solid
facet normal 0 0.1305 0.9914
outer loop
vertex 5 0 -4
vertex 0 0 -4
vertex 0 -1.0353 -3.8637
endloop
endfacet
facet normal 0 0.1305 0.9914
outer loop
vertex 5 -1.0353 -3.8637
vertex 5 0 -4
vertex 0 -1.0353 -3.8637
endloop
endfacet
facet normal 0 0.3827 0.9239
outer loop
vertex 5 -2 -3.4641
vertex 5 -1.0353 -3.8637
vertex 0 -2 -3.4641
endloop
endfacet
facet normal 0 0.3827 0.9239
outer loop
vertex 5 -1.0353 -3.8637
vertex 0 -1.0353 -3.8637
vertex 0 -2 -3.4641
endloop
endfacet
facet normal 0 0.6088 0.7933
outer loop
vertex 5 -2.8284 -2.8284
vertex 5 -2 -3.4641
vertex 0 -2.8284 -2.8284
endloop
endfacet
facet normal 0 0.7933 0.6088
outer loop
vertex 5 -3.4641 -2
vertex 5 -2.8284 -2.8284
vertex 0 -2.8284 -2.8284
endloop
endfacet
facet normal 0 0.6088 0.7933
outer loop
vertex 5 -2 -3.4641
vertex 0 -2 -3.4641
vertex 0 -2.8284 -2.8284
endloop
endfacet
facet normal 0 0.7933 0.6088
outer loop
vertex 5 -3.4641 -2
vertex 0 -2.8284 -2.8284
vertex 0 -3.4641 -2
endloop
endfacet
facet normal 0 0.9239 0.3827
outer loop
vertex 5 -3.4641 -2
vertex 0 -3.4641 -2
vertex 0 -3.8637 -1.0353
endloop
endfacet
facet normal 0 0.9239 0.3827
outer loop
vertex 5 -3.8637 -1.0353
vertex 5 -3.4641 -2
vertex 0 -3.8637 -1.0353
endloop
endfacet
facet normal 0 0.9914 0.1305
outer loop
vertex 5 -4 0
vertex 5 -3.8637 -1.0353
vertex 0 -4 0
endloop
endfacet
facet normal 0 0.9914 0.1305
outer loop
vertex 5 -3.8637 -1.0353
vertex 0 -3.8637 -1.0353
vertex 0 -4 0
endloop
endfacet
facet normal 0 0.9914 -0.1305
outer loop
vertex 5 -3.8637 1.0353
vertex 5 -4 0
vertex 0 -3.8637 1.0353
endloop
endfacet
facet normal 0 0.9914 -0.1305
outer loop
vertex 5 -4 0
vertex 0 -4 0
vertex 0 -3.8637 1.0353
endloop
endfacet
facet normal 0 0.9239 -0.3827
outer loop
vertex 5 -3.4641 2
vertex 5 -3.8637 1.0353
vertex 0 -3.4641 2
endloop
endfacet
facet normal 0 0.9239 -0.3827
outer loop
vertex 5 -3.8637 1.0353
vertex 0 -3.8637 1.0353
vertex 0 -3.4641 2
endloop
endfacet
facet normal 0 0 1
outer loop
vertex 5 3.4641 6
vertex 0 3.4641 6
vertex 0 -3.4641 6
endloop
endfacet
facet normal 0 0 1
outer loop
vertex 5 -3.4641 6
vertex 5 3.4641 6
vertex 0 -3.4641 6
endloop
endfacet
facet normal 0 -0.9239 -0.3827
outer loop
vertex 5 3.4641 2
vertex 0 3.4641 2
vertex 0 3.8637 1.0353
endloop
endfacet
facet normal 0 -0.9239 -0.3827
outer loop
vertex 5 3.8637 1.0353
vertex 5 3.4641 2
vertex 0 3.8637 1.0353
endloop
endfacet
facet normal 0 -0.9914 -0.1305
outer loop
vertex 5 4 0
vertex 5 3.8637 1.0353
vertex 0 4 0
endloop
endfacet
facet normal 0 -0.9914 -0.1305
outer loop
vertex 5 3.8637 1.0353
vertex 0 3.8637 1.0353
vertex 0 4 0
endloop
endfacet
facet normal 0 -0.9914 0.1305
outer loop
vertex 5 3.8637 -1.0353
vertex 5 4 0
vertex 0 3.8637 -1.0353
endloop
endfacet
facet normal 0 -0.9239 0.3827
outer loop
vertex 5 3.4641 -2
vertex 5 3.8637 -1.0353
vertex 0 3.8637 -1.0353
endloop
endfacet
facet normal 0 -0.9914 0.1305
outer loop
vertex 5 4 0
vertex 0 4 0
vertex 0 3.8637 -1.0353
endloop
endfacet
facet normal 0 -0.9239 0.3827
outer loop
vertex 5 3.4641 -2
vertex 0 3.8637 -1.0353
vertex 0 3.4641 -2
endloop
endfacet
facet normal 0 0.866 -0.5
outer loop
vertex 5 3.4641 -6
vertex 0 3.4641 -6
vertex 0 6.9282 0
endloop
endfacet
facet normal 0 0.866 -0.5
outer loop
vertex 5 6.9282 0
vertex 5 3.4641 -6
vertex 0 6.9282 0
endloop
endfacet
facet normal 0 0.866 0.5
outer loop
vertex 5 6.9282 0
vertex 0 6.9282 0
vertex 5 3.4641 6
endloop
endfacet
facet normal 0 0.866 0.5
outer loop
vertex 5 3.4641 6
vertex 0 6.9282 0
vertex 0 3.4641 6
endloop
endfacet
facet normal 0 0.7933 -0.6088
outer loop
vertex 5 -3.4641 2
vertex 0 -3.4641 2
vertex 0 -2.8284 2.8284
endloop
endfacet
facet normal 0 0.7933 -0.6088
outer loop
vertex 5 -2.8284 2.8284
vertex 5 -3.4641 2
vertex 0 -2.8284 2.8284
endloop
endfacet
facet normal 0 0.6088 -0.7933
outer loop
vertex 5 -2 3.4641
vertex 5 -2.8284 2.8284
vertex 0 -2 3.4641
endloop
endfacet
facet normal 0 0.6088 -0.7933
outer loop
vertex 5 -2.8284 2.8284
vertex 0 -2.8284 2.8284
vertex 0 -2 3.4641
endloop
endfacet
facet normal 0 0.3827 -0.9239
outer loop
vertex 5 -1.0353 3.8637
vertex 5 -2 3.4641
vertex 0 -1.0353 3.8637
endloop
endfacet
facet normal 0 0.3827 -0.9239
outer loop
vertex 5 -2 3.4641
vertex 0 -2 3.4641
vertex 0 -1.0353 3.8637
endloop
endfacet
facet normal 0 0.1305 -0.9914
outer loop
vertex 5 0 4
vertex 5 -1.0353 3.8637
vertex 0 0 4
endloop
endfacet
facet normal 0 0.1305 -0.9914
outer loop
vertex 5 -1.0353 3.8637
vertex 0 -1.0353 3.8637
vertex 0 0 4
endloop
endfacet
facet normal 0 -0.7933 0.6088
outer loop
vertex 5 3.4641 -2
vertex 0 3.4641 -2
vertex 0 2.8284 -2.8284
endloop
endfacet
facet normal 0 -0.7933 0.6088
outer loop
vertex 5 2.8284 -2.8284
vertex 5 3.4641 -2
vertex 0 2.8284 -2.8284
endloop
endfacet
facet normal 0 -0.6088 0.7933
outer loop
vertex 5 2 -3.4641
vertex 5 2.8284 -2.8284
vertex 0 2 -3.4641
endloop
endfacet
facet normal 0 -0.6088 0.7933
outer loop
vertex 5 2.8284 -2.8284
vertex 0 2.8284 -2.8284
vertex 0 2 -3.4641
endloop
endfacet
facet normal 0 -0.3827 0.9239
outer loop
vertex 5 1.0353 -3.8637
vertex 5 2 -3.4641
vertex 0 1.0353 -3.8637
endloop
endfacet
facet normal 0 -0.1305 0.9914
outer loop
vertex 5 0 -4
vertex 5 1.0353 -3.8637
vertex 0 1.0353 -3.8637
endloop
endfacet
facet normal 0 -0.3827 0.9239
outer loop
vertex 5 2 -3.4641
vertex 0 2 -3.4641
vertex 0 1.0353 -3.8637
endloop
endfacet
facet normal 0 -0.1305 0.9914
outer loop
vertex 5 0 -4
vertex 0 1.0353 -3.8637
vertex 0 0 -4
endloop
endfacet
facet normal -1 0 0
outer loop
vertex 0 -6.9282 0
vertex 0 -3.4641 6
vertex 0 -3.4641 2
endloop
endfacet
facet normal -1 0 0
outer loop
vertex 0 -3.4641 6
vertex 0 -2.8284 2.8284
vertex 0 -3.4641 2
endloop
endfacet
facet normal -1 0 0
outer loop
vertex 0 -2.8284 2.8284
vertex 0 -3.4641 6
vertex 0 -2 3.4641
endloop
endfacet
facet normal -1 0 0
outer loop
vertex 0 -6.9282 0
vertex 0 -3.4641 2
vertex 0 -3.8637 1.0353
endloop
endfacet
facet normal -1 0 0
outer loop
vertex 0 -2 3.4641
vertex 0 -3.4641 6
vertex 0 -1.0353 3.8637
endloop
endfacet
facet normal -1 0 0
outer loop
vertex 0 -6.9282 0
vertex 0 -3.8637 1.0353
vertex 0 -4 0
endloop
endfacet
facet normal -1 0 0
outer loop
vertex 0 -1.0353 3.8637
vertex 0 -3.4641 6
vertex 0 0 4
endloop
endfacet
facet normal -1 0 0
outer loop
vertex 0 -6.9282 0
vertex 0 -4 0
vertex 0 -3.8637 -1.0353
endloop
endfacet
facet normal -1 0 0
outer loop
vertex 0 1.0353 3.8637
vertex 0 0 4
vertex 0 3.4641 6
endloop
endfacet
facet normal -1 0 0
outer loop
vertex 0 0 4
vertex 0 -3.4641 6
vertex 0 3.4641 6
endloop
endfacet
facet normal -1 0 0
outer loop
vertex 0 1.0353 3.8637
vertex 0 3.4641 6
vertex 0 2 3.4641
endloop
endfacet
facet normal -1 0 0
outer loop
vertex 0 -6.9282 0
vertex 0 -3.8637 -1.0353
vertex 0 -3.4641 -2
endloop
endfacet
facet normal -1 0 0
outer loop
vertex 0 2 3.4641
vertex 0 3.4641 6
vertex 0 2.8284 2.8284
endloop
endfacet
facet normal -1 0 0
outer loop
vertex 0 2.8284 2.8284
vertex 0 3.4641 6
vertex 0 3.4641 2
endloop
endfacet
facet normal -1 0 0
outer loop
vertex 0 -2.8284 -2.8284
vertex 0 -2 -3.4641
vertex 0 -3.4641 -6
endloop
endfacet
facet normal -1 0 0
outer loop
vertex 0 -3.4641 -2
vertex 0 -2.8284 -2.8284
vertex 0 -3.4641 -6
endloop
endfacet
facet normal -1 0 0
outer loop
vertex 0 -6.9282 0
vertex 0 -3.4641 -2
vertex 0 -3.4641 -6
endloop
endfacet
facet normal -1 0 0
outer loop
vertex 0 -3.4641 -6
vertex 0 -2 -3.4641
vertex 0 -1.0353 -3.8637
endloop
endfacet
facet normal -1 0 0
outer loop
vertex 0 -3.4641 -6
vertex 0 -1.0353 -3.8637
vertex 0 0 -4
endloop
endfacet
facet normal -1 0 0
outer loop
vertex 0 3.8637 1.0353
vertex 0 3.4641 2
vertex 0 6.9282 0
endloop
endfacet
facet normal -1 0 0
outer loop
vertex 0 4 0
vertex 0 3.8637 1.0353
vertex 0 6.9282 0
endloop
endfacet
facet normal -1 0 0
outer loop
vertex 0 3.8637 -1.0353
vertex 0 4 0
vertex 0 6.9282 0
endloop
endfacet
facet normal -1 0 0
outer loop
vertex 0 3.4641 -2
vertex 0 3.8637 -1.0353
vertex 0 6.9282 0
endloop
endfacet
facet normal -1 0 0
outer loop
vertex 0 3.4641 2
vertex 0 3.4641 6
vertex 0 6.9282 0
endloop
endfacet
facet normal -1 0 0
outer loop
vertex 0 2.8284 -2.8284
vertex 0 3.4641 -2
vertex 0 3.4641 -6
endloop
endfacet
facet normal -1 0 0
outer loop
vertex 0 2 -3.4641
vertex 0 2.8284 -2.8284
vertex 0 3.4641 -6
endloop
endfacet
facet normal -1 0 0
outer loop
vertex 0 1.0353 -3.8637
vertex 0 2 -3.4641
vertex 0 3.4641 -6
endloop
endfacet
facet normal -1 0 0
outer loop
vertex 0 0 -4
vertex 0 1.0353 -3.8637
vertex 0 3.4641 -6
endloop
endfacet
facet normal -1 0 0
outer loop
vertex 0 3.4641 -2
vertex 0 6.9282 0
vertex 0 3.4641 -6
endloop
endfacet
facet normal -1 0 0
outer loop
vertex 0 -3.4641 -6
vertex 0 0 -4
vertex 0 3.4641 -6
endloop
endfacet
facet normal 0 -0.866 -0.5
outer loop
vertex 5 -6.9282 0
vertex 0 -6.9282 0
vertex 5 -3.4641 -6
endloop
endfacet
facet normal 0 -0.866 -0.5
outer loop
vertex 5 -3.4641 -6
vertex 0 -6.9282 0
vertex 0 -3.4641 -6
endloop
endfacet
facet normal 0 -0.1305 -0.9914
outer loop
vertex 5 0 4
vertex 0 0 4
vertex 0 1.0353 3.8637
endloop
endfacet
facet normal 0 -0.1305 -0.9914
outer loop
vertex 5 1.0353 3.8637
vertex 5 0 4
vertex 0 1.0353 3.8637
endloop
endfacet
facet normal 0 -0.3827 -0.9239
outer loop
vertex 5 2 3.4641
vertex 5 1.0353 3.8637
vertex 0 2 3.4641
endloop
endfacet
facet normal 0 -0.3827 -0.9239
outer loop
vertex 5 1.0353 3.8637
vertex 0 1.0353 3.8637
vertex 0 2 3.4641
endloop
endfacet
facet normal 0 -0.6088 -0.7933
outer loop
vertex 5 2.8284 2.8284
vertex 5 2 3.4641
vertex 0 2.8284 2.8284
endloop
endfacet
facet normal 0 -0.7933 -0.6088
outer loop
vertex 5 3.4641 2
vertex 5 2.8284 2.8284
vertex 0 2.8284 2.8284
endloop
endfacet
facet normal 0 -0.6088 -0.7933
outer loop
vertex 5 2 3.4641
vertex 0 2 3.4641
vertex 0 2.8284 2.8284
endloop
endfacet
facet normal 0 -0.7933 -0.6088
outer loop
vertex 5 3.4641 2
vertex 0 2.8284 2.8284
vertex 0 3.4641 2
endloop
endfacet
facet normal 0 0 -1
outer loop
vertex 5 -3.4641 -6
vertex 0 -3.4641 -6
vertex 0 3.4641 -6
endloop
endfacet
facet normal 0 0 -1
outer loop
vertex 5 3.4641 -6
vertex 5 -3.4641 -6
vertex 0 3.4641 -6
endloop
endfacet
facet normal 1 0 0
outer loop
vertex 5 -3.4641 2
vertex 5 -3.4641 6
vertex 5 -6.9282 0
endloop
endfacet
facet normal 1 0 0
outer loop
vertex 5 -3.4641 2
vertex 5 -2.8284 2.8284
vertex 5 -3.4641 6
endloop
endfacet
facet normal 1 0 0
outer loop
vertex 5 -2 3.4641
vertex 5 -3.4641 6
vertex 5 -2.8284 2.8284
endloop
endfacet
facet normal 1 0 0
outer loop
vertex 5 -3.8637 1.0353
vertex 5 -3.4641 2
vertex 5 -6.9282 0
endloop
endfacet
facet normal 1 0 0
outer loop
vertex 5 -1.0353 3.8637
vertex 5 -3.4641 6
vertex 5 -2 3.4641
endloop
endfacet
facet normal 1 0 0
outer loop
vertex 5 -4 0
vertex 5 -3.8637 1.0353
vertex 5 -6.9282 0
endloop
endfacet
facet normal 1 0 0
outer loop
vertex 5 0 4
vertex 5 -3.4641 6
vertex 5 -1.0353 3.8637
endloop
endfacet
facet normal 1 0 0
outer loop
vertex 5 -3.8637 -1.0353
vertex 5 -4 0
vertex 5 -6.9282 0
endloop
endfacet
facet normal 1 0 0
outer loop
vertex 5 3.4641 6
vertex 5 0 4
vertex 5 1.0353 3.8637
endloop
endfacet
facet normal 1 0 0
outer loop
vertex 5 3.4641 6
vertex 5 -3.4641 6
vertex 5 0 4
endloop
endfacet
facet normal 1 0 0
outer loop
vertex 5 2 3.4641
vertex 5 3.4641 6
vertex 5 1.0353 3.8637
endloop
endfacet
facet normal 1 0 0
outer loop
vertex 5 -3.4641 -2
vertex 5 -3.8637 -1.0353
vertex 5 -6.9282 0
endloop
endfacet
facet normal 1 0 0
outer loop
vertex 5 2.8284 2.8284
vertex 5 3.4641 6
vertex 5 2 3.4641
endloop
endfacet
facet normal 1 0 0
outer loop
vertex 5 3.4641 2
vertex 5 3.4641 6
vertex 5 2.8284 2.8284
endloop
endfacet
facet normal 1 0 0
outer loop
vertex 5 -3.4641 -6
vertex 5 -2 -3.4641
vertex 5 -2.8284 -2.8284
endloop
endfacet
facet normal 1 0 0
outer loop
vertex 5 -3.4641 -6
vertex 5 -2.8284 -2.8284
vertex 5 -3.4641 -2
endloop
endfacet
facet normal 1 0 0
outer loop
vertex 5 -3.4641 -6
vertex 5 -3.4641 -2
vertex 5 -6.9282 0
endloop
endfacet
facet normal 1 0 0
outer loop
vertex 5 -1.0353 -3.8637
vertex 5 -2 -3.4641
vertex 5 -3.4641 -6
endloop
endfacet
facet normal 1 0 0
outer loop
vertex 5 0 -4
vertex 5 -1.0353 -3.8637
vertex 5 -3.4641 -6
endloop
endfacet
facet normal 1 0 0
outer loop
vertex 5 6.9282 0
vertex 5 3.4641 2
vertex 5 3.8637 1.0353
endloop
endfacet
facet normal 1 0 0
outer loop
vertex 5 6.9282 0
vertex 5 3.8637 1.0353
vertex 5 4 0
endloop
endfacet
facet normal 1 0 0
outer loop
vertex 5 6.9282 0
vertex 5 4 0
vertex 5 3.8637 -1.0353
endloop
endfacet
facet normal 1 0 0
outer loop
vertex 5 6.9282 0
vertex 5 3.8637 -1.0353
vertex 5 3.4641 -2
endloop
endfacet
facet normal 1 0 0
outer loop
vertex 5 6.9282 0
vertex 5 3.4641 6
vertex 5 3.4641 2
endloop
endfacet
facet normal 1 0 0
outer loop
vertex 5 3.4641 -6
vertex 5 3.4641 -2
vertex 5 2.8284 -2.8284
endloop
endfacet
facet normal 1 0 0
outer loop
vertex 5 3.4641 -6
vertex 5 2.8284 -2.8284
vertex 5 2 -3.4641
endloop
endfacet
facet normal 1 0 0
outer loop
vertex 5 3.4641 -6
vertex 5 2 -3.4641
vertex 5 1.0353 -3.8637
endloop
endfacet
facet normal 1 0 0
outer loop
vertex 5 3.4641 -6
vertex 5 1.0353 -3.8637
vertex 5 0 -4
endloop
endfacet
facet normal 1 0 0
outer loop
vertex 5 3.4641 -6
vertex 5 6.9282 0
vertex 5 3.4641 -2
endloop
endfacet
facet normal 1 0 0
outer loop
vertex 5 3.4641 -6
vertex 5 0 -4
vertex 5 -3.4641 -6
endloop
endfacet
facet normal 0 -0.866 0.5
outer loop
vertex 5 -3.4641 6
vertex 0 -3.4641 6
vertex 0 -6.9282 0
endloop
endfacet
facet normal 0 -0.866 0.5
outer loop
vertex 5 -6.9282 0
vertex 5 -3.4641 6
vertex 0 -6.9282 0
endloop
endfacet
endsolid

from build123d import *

# Parameters (mm, degrees)
EXTRUDE_1_DEPTH = 5


with BuildPart() as part:
    # 草图1 → 凸台-拉伸1 (new body)
    # profile 1 of 7: a face of its own
    with BuildSketch(Plane(origin=(0, 0, 0), x_dir=(0, 0, -1), z_dir=(1, 0, 0))):
        Polygon((6, -3.464101615), (6, 3.464101615), (0, 6.92820323), (-6, 3.464101615), (-6, -3.464101615), (0, -6.92820323), align=None)
        Polygon((0, -4.618802154), (4, -2.309401077), (4, 2.309401077), (0, 4.618802154), (-4, 2.309401077), (-4, -2.309401077), align=None, mode=Mode.SUBTRACT)
    # profile 2 of 7: a face of its own
    with BuildSketch(Plane(origin=(0, 0, 0), x_dir=(0, 0, -1), z_dir=(1, 0, 0))):
        with BuildLine():
            ThreePointArc((-4, 0), (-3.464101617, 1.999999997), (-2.000000006, 3.464101612))
            Line((-2.000000006, 3.464101612), (-4, 2.309401077))
            Line((-4, 2.309401077), (-4, 0))
        make_face()
    # profile 3 of 7: a face of its own
    with BuildSketch(Plane(origin=(0, 0, 0), x_dir=(0, 0, -1), z_dir=(1, 0, 0))):
        with BuildLine():
            Line((-4, -2.309401077), (-2.000000006, -3.464101612))
            ThreePointArc((-2.000000006, -3.464101612), (-3.464101617, -1.999999997), (-4, 0))
            Line((-4, 0), (-4, -2.309401077))
        make_face()
    # profile 4 of 7: a face of its own
    with BuildSketch(Plane(origin=(0, 0, 0), x_dir=(0, 0, -1), z_dir=(1, 0, 0))):
        with BuildLine():
            Line((0, -4.618802154), (2.000000006, -3.464101612))
            ThreePointArc((2.000000006, -3.464101612), (0, -4), (-2.000000006, -3.464101612))
            Line((-2.000000006, -3.464101612), (0, -4.618802154))
        make_face()
    # profile 5 of 7: a face of its own
    with BuildSketch(Plane(origin=(0, 0, 0), x_dir=(0, 0, -1), z_dir=(1, 0, 0))):
        with BuildLine():
            Line((2.000000006, -3.464101612), (4, -2.309401077))
            Line((4, -2.309401077), (4, 0))
            ThreePointArc((4, 0), (3.464101617, -1.999999997), (2.000000006, -3.464101612))
        make_face()
    # profile 6 of 7: a face of its own
    with BuildSketch(Plane(origin=(0, 0, 0), x_dir=(0, 0, -1), z_dir=(1, 0, 0))):
        with BuildLine():
            ThreePointArc((2.000000034, 3.464101596), (3.464101625, 1.999999983), (4, 0))
            Line((4, 0), (4, 2.309401077))
            Line((4, 2.309401077), (2.000000034, 3.464101596))
        make_face()
    # profile 7 of 7: a face of its own
    with BuildSketch(Plane(origin=(0, 0, 0), x_dir=(0, 0, -1), z_dir=(1, 0, 0))):
        with BuildLine():
            ThreePointArc((-2.000000006, 3.464101612), (1.6e-08, 4), (2.000000034, 3.464101596))
            Line((2.000000034, 3.464101596), (0, 4.618802154))
            Line((0, 4.618802154), (-2.000000006, 3.464101612))
        make_face()
    extrude(amount=EXTRUDE_1_DEPTH)


solid = part.part
